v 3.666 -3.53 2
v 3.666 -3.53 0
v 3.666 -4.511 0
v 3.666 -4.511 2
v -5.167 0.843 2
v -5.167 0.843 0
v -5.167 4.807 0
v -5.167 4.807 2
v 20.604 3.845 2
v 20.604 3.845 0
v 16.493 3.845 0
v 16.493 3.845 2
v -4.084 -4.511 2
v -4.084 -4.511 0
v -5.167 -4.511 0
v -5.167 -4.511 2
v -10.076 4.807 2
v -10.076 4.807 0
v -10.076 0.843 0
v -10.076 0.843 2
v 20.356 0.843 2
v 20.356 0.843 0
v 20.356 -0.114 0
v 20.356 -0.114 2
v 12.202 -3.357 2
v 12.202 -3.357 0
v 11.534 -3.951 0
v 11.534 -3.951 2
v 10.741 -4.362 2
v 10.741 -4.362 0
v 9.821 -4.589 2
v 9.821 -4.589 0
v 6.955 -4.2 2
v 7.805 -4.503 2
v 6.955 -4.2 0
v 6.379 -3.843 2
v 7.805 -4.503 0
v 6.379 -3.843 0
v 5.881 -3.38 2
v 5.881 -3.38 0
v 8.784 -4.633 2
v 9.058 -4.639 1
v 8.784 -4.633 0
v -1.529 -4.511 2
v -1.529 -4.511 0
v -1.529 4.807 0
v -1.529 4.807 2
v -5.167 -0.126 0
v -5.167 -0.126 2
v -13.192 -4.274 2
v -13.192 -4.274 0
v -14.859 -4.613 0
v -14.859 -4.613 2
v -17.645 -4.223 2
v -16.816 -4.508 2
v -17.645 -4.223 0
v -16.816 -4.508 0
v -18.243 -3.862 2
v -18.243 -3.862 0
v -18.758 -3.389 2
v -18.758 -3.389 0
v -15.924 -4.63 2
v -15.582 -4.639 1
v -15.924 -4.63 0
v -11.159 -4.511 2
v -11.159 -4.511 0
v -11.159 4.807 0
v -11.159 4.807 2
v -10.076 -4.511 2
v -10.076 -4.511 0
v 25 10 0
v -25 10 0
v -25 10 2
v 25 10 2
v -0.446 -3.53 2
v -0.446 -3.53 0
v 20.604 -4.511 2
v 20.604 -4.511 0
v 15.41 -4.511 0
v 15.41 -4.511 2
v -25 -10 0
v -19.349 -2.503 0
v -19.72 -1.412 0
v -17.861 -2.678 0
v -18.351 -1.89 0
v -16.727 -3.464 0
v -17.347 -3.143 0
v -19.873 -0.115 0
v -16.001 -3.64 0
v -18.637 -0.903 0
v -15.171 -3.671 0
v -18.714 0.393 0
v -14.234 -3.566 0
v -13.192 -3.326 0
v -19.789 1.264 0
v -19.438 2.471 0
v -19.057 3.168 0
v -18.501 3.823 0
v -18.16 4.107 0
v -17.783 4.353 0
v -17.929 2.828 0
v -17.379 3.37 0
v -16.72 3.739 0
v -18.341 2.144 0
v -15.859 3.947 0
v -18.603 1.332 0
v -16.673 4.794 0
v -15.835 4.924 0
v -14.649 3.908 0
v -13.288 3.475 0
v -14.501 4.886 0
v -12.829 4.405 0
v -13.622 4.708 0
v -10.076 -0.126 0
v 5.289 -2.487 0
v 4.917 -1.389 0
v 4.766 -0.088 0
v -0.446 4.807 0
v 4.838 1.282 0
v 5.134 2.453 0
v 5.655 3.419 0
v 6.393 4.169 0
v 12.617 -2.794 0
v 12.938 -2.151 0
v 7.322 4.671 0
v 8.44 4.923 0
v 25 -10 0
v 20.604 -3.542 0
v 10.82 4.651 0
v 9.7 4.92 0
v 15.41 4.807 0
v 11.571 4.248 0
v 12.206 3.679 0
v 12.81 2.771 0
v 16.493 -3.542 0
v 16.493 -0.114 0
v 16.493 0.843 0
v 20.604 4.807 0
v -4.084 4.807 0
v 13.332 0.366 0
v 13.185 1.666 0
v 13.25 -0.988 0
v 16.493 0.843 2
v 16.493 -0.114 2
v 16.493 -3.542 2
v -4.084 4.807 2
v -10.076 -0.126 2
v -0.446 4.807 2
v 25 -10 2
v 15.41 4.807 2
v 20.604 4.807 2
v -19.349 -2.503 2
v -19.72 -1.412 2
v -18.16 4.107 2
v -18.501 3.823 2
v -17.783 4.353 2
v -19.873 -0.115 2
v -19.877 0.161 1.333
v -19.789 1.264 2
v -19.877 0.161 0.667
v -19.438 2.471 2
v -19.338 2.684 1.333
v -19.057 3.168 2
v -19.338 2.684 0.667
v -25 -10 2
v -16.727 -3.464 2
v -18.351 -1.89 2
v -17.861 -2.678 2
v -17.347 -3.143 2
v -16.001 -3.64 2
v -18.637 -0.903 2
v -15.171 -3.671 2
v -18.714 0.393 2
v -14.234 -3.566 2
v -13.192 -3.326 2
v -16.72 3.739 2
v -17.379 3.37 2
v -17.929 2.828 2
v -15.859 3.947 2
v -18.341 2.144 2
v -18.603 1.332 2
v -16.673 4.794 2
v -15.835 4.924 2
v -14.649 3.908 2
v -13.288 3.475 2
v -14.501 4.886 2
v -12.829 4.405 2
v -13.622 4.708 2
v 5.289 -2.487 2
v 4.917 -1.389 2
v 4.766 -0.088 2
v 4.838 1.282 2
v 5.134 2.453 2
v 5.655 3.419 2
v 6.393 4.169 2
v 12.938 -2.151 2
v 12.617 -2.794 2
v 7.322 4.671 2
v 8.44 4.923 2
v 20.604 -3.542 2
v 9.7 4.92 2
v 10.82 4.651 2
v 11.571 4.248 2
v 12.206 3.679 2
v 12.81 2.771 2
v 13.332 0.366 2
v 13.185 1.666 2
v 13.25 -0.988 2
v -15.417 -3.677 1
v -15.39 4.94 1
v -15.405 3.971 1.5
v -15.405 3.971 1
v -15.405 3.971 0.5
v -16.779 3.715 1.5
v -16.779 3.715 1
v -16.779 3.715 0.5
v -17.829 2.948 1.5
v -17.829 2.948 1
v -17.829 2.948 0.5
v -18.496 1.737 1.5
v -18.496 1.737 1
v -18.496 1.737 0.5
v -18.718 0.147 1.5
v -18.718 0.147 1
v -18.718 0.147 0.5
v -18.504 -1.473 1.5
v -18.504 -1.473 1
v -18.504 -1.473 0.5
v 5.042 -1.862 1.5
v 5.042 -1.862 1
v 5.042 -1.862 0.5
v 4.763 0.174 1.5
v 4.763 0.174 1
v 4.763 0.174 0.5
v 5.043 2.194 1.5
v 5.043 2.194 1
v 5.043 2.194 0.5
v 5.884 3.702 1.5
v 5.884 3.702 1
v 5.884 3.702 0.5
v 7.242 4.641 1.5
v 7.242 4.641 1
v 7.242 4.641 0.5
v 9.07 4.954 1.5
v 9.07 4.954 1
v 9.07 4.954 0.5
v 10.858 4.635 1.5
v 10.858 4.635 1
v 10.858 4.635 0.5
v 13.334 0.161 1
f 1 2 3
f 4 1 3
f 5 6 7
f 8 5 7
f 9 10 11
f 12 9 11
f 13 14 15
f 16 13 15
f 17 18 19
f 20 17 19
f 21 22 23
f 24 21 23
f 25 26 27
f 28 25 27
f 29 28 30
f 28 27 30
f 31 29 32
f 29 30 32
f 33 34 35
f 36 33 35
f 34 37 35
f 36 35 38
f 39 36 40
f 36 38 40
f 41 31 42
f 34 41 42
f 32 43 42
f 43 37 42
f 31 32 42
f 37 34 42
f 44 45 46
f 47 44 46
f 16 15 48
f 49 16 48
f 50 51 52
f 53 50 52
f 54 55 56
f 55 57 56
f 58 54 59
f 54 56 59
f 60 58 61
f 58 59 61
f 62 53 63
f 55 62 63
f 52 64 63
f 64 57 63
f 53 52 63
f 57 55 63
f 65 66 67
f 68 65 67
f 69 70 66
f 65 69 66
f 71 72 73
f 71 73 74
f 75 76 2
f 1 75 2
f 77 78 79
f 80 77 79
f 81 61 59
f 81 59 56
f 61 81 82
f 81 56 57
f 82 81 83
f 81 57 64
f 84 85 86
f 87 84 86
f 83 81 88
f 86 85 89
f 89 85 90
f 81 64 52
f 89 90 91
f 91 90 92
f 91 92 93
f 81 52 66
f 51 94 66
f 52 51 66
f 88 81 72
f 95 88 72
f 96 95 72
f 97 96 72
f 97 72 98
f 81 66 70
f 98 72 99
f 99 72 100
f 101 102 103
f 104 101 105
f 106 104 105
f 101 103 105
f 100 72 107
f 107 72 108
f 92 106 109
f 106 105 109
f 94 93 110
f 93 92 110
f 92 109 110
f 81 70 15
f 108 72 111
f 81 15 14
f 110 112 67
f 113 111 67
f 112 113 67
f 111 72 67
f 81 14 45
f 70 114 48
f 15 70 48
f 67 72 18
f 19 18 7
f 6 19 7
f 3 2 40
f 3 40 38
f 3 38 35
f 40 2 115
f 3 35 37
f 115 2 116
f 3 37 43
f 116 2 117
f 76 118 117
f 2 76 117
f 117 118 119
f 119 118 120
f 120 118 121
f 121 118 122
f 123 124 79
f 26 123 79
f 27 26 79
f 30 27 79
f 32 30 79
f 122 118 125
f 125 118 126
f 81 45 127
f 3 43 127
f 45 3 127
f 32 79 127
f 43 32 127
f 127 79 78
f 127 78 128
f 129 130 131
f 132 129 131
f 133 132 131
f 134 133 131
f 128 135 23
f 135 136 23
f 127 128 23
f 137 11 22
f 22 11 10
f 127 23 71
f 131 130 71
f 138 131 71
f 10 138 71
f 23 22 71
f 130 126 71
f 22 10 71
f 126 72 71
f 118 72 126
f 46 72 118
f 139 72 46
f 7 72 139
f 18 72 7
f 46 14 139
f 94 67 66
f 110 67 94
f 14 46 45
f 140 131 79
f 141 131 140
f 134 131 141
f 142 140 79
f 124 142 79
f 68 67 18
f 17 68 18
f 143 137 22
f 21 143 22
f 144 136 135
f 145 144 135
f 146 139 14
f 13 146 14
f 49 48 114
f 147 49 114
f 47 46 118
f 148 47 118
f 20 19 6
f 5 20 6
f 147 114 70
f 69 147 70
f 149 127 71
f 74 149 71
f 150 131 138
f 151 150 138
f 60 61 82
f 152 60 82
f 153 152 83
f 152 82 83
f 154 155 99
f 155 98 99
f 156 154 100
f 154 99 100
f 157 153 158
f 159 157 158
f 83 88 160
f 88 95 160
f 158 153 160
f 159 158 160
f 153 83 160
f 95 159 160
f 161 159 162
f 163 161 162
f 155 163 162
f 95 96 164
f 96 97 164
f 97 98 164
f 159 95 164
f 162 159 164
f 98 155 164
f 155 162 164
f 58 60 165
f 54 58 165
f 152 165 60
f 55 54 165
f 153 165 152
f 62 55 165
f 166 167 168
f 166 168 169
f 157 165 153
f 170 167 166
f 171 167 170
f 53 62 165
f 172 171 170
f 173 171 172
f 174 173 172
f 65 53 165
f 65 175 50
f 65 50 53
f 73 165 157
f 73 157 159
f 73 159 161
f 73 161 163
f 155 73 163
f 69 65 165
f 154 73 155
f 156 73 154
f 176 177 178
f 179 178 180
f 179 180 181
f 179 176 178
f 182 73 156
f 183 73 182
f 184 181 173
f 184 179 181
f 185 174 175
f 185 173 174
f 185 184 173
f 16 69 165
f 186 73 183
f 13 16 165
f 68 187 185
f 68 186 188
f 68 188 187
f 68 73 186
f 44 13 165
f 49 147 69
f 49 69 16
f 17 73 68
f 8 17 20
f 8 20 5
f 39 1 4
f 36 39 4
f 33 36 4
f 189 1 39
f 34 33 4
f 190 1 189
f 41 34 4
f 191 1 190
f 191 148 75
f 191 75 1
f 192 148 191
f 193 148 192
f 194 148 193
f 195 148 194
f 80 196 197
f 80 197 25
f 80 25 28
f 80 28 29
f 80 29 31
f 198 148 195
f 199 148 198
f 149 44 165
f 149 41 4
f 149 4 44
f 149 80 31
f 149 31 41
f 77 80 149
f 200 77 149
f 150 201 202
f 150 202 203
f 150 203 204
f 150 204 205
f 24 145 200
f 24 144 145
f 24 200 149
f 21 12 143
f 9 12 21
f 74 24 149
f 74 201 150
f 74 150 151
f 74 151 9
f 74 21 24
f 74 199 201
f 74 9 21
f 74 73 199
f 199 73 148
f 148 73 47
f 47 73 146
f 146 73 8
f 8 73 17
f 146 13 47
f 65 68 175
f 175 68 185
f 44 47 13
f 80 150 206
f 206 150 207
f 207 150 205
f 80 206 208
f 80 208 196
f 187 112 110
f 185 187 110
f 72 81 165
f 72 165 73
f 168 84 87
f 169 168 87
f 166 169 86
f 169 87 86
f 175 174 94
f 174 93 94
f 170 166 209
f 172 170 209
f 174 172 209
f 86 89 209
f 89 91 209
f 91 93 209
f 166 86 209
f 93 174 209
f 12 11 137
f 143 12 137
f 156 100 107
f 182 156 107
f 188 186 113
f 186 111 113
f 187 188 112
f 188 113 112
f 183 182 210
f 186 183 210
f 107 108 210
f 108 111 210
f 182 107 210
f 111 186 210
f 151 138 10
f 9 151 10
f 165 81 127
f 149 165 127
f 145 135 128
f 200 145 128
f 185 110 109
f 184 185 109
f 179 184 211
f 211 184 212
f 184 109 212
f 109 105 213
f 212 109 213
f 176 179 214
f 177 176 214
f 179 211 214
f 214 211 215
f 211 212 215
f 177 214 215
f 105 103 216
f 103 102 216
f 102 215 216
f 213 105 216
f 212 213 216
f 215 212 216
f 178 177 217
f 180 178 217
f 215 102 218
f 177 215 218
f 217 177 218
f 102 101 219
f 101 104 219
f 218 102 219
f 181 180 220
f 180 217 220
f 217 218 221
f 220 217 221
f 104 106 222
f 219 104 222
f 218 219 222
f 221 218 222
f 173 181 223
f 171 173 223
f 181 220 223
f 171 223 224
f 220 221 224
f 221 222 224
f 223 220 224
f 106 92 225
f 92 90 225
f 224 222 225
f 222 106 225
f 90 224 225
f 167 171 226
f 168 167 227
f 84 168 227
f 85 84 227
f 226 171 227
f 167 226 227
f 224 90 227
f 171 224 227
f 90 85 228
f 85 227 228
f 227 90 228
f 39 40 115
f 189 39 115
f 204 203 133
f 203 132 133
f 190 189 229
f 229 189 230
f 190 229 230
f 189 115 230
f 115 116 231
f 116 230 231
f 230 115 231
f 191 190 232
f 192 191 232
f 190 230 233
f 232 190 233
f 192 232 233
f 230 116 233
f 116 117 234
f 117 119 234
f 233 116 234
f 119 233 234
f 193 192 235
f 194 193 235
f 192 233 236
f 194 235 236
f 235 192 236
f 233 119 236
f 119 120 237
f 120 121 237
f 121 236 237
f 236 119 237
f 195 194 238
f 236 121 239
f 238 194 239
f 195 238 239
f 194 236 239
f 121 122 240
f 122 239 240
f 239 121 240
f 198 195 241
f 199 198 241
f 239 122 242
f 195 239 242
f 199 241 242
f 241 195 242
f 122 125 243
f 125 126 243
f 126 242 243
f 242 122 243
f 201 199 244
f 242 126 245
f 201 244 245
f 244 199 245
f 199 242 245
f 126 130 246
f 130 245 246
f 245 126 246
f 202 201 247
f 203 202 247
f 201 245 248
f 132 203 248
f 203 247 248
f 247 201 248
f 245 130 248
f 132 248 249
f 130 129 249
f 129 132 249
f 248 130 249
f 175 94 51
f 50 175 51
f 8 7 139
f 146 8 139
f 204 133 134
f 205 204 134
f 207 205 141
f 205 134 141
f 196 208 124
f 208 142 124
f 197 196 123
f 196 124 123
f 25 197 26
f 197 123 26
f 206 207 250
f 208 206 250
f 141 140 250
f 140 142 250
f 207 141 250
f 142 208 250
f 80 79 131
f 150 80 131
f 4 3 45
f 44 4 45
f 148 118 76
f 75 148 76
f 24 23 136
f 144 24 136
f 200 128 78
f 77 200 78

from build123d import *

# Parameters (mm, degrees)
F0_W     = 50
F0_H     = 20
F1_DEPTH = 2


with BuildPart() as f1:
    # F0 (on Top) → F1 (new body)
    with BuildSketch(Plane.XY):
        Rectangle(F0_W, F0_H)
        with BuildLine():
            add(Edge.make_bspline(
                [(-13.2876596552, 3.4753973501), (-14.3460879777, 3.970962056), (-15.4045163003, 3.970962056)],
                knots=[0, 0, 0, 1, 1, 1], degree=2))
            add(Edge.make_bspline(
                [(-15.4045163003, 3.970962056), (-16.9401550804, 3.970962056), (-17.8293164458, 2.9482225497)],
                knots=[0, 0, 0, 1, 1, 1], degree=2))
            add(Edge.make_bspline(
                [(-17.8293164458, 2.9482225497), (-18.7184778112, 1.9254830434), (-18.7184778112, 0.1471603126)],
                knots=[0, 0, 0, 1, 1, 1], degree=2))
            add(Edge.make_bspline(
                [(-18.7184778112, 0.1471603126), (-18.7184778112, -1.6801070805), (-17.8609265403, -2.6783742556)],
                knots=[0, 0, 0, 1, 1, 1], degree=2))
            add(Edge.make_bspline(
                [(-17.8609265403, -2.6783742556), (-17.0033752693, -3.6766414308), (-15.4167524659, -3.6766414308)],
                knots=[0, 0, 0, 1, 1, 1], degree=2))
            add(Edge.make_bspline(
                [(-15.4167524659, -3.6766414308), (-14.4419379414, -3.6766414308), (-13.1918096915, -3.3258713508)],
                knots=[0, 0, 0, 1, 1, 1], degree=2))
            Line((-13.1918096915, -3.3258713508), (-13.1918096915, -4.2741741832))
            add(Edge.make_bspline(
                [(-13.1918096915, -4.2741741832), (-14.1605061331, -4.6392197896), (-15.5819407012, -4.6392197896)],
                knots=[0, 0, 0, 1, 1, 1], degree=2))
            add(Edge.make_bspline(
                [(-15.5819407012, -4.6392197896), (-17.6396558794, -4.6392197896), (-18.7582453494, -3.3890915397)],
                knots=[0, 0, 0, 1, 1, 1], degree=2))
            add(Edge.make_bspline(
                [(-18.7582453494, -3.3890915397), (-19.8768348194, -2.1389632897), (-19.8768348194, 0.1614358391)],
                knots=[0, 0, 0, 1, 1, 1], degree=2))
            add(Edge.make_bspline(
                [(-19.8768348194, 0.1614358391), (-19.8768348194, 1.6012246556), (-19.3384435339, 2.6841253093)],
                knots=[0, 0, 0, 1, 1, 1], degree=2))
            add(Edge.make_bspline(
                [(-19.3384435339, 2.6841253093), (-18.8000522484, 3.767025963), (-17.7834308249, 4.3533422304)],
                knots=[0, 0, 0, 1, 1, 1], degree=2))
            add(Edge.make_bspline(
                [(-17.7834308249, 4.3533422304), (-16.7668094014, 4.9396584977), (-15.3902407738, 4.9396584977)],
                knots=[0, 0, 0, 1, 1, 1], degree=2))
            add(Edge.make_bspline(
                [(-15.3902407738, 4.9396584977), (-13.9259796262, 4.9396584977), (-12.828803446, 4.4053459341)],
                knots=[0, 0, 0, 1, 1, 1], degree=2))
            Line((-12.828803446, 4.4053459341), (-13.2876596552, 3.4753973501))
        make_face(mode=Mode.SUBTRACT)
        Polygon((-4.0840237789, 4.8071000372), (-4.0840237789, -4.510740051), (-5.1669244327, -4.510740051), (-5.1669244327, -0.126114052), (-10.0756661907, -0.126114052), (-10.0756661907, -4.510740051), (-11.1585668444, -4.510740051), (-11.1585668444, 4.8071000372), (-10.0756661907, 4.8071000372), (-10.0756661907, 0.8425823897), (-5.1669244327, 0.8425823897), (-5.1669244327, 4.8071000372), align=None, mode=Mode.SUBTRACT)
        Polygon((3.6655477543, -4.510740051), (-1.5287045339, -4.510740051), (-1.5287045339, 4.8071000372), (-0.4458038802, 4.8071000372), (-0.4458038802, -3.5298074438), (3.6655477543, -3.5298074438), align=None, mode=Mode.SUBTRACT)
        with BuildLine():
            add(Edge.make_bspline(
                [(12.2063913284, 3.6793334431), (13.3341579225, 2.4047328619), (13.3341579225, 0.1614358391)],
                knots=[0, 0, 0, 1, 1, 1], degree=2))
            add(Edge.make_bspline(
                [(13.3341579225, 0.1614358391), (13.3341579225, -2.0757431009), (12.2023126065, -3.3574814452)],
                knots=[0, 0, 0, 1, 1, 1], degree=2))
            add(Edge.make_bspline(
                [(12.2023126065, -3.3574814452), (11.0704672905, -4.6392197896), (9.0576180527, -4.6392197896)],
                knots=[0, 0, 0, 1, 1, 1], degree=2))
            add(Edge.make_bspline(
                [(9.0576180527, -4.6392197896), (6.9999028746, -4.6392197896), (5.8813134046, -3.3799144155)],
                knots=[0, 0, 0, 1, 1, 1], degree=2))
            add(Edge.make_bspline(
                [(5.8813134046, -3.3799144155), (4.7627239346, -2.1206090413), (4.7627239346, 0.1736720047)],
                knots=[0, 0, 0, 1, 1, 1], degree=2))
            add(Edge.make_bspline(
                [(4.7627239346, 0.1736720047), (4.7627239346, 2.4495988024), (5.884372446, 3.7017664133)],
                knots=[0, 0, 0, 1, 1, 1], degree=2))
            add(Edge.make_bspline(
                [(5.884372446, 3.7017664133), (7.0060209574, 4.9539340242), (9.0698542183, 4.9539340242)],
                knots=[0, 0, 0, 1, 1, 1], degree=2))
            add(Edge.make_bspline(
                [(9.0698542183, 4.9539340242), (11.0786247342, 4.9539340242), (12.2063913284, 3.6793334431)],
                knots=[0, 0, 0, 1, 1, 1], degree=2))
        make_face(mode=Mode.SUBTRACT)
        Polygon((20.6044796373, -3.5420436094), (20.6044796373, -4.510740051), (15.4102273491, -4.510740051), (15.4102273491, 4.8071000372), (20.6044796373, 4.8071000372), (20.6044796373, 3.8445216784), (16.4931280028, 3.8445216784), (16.4931280028, 0.8425823897), (20.3556776039, 0.8425823897), (20.3556776039, -0.1138778864), (16.4931280028, -0.1138778864), (16.4931280028, -3.5420436094), align=None, mode=Mode.SUBTRACT)
    extrude(amount=F1_DEPTH)


solid = f1.part
